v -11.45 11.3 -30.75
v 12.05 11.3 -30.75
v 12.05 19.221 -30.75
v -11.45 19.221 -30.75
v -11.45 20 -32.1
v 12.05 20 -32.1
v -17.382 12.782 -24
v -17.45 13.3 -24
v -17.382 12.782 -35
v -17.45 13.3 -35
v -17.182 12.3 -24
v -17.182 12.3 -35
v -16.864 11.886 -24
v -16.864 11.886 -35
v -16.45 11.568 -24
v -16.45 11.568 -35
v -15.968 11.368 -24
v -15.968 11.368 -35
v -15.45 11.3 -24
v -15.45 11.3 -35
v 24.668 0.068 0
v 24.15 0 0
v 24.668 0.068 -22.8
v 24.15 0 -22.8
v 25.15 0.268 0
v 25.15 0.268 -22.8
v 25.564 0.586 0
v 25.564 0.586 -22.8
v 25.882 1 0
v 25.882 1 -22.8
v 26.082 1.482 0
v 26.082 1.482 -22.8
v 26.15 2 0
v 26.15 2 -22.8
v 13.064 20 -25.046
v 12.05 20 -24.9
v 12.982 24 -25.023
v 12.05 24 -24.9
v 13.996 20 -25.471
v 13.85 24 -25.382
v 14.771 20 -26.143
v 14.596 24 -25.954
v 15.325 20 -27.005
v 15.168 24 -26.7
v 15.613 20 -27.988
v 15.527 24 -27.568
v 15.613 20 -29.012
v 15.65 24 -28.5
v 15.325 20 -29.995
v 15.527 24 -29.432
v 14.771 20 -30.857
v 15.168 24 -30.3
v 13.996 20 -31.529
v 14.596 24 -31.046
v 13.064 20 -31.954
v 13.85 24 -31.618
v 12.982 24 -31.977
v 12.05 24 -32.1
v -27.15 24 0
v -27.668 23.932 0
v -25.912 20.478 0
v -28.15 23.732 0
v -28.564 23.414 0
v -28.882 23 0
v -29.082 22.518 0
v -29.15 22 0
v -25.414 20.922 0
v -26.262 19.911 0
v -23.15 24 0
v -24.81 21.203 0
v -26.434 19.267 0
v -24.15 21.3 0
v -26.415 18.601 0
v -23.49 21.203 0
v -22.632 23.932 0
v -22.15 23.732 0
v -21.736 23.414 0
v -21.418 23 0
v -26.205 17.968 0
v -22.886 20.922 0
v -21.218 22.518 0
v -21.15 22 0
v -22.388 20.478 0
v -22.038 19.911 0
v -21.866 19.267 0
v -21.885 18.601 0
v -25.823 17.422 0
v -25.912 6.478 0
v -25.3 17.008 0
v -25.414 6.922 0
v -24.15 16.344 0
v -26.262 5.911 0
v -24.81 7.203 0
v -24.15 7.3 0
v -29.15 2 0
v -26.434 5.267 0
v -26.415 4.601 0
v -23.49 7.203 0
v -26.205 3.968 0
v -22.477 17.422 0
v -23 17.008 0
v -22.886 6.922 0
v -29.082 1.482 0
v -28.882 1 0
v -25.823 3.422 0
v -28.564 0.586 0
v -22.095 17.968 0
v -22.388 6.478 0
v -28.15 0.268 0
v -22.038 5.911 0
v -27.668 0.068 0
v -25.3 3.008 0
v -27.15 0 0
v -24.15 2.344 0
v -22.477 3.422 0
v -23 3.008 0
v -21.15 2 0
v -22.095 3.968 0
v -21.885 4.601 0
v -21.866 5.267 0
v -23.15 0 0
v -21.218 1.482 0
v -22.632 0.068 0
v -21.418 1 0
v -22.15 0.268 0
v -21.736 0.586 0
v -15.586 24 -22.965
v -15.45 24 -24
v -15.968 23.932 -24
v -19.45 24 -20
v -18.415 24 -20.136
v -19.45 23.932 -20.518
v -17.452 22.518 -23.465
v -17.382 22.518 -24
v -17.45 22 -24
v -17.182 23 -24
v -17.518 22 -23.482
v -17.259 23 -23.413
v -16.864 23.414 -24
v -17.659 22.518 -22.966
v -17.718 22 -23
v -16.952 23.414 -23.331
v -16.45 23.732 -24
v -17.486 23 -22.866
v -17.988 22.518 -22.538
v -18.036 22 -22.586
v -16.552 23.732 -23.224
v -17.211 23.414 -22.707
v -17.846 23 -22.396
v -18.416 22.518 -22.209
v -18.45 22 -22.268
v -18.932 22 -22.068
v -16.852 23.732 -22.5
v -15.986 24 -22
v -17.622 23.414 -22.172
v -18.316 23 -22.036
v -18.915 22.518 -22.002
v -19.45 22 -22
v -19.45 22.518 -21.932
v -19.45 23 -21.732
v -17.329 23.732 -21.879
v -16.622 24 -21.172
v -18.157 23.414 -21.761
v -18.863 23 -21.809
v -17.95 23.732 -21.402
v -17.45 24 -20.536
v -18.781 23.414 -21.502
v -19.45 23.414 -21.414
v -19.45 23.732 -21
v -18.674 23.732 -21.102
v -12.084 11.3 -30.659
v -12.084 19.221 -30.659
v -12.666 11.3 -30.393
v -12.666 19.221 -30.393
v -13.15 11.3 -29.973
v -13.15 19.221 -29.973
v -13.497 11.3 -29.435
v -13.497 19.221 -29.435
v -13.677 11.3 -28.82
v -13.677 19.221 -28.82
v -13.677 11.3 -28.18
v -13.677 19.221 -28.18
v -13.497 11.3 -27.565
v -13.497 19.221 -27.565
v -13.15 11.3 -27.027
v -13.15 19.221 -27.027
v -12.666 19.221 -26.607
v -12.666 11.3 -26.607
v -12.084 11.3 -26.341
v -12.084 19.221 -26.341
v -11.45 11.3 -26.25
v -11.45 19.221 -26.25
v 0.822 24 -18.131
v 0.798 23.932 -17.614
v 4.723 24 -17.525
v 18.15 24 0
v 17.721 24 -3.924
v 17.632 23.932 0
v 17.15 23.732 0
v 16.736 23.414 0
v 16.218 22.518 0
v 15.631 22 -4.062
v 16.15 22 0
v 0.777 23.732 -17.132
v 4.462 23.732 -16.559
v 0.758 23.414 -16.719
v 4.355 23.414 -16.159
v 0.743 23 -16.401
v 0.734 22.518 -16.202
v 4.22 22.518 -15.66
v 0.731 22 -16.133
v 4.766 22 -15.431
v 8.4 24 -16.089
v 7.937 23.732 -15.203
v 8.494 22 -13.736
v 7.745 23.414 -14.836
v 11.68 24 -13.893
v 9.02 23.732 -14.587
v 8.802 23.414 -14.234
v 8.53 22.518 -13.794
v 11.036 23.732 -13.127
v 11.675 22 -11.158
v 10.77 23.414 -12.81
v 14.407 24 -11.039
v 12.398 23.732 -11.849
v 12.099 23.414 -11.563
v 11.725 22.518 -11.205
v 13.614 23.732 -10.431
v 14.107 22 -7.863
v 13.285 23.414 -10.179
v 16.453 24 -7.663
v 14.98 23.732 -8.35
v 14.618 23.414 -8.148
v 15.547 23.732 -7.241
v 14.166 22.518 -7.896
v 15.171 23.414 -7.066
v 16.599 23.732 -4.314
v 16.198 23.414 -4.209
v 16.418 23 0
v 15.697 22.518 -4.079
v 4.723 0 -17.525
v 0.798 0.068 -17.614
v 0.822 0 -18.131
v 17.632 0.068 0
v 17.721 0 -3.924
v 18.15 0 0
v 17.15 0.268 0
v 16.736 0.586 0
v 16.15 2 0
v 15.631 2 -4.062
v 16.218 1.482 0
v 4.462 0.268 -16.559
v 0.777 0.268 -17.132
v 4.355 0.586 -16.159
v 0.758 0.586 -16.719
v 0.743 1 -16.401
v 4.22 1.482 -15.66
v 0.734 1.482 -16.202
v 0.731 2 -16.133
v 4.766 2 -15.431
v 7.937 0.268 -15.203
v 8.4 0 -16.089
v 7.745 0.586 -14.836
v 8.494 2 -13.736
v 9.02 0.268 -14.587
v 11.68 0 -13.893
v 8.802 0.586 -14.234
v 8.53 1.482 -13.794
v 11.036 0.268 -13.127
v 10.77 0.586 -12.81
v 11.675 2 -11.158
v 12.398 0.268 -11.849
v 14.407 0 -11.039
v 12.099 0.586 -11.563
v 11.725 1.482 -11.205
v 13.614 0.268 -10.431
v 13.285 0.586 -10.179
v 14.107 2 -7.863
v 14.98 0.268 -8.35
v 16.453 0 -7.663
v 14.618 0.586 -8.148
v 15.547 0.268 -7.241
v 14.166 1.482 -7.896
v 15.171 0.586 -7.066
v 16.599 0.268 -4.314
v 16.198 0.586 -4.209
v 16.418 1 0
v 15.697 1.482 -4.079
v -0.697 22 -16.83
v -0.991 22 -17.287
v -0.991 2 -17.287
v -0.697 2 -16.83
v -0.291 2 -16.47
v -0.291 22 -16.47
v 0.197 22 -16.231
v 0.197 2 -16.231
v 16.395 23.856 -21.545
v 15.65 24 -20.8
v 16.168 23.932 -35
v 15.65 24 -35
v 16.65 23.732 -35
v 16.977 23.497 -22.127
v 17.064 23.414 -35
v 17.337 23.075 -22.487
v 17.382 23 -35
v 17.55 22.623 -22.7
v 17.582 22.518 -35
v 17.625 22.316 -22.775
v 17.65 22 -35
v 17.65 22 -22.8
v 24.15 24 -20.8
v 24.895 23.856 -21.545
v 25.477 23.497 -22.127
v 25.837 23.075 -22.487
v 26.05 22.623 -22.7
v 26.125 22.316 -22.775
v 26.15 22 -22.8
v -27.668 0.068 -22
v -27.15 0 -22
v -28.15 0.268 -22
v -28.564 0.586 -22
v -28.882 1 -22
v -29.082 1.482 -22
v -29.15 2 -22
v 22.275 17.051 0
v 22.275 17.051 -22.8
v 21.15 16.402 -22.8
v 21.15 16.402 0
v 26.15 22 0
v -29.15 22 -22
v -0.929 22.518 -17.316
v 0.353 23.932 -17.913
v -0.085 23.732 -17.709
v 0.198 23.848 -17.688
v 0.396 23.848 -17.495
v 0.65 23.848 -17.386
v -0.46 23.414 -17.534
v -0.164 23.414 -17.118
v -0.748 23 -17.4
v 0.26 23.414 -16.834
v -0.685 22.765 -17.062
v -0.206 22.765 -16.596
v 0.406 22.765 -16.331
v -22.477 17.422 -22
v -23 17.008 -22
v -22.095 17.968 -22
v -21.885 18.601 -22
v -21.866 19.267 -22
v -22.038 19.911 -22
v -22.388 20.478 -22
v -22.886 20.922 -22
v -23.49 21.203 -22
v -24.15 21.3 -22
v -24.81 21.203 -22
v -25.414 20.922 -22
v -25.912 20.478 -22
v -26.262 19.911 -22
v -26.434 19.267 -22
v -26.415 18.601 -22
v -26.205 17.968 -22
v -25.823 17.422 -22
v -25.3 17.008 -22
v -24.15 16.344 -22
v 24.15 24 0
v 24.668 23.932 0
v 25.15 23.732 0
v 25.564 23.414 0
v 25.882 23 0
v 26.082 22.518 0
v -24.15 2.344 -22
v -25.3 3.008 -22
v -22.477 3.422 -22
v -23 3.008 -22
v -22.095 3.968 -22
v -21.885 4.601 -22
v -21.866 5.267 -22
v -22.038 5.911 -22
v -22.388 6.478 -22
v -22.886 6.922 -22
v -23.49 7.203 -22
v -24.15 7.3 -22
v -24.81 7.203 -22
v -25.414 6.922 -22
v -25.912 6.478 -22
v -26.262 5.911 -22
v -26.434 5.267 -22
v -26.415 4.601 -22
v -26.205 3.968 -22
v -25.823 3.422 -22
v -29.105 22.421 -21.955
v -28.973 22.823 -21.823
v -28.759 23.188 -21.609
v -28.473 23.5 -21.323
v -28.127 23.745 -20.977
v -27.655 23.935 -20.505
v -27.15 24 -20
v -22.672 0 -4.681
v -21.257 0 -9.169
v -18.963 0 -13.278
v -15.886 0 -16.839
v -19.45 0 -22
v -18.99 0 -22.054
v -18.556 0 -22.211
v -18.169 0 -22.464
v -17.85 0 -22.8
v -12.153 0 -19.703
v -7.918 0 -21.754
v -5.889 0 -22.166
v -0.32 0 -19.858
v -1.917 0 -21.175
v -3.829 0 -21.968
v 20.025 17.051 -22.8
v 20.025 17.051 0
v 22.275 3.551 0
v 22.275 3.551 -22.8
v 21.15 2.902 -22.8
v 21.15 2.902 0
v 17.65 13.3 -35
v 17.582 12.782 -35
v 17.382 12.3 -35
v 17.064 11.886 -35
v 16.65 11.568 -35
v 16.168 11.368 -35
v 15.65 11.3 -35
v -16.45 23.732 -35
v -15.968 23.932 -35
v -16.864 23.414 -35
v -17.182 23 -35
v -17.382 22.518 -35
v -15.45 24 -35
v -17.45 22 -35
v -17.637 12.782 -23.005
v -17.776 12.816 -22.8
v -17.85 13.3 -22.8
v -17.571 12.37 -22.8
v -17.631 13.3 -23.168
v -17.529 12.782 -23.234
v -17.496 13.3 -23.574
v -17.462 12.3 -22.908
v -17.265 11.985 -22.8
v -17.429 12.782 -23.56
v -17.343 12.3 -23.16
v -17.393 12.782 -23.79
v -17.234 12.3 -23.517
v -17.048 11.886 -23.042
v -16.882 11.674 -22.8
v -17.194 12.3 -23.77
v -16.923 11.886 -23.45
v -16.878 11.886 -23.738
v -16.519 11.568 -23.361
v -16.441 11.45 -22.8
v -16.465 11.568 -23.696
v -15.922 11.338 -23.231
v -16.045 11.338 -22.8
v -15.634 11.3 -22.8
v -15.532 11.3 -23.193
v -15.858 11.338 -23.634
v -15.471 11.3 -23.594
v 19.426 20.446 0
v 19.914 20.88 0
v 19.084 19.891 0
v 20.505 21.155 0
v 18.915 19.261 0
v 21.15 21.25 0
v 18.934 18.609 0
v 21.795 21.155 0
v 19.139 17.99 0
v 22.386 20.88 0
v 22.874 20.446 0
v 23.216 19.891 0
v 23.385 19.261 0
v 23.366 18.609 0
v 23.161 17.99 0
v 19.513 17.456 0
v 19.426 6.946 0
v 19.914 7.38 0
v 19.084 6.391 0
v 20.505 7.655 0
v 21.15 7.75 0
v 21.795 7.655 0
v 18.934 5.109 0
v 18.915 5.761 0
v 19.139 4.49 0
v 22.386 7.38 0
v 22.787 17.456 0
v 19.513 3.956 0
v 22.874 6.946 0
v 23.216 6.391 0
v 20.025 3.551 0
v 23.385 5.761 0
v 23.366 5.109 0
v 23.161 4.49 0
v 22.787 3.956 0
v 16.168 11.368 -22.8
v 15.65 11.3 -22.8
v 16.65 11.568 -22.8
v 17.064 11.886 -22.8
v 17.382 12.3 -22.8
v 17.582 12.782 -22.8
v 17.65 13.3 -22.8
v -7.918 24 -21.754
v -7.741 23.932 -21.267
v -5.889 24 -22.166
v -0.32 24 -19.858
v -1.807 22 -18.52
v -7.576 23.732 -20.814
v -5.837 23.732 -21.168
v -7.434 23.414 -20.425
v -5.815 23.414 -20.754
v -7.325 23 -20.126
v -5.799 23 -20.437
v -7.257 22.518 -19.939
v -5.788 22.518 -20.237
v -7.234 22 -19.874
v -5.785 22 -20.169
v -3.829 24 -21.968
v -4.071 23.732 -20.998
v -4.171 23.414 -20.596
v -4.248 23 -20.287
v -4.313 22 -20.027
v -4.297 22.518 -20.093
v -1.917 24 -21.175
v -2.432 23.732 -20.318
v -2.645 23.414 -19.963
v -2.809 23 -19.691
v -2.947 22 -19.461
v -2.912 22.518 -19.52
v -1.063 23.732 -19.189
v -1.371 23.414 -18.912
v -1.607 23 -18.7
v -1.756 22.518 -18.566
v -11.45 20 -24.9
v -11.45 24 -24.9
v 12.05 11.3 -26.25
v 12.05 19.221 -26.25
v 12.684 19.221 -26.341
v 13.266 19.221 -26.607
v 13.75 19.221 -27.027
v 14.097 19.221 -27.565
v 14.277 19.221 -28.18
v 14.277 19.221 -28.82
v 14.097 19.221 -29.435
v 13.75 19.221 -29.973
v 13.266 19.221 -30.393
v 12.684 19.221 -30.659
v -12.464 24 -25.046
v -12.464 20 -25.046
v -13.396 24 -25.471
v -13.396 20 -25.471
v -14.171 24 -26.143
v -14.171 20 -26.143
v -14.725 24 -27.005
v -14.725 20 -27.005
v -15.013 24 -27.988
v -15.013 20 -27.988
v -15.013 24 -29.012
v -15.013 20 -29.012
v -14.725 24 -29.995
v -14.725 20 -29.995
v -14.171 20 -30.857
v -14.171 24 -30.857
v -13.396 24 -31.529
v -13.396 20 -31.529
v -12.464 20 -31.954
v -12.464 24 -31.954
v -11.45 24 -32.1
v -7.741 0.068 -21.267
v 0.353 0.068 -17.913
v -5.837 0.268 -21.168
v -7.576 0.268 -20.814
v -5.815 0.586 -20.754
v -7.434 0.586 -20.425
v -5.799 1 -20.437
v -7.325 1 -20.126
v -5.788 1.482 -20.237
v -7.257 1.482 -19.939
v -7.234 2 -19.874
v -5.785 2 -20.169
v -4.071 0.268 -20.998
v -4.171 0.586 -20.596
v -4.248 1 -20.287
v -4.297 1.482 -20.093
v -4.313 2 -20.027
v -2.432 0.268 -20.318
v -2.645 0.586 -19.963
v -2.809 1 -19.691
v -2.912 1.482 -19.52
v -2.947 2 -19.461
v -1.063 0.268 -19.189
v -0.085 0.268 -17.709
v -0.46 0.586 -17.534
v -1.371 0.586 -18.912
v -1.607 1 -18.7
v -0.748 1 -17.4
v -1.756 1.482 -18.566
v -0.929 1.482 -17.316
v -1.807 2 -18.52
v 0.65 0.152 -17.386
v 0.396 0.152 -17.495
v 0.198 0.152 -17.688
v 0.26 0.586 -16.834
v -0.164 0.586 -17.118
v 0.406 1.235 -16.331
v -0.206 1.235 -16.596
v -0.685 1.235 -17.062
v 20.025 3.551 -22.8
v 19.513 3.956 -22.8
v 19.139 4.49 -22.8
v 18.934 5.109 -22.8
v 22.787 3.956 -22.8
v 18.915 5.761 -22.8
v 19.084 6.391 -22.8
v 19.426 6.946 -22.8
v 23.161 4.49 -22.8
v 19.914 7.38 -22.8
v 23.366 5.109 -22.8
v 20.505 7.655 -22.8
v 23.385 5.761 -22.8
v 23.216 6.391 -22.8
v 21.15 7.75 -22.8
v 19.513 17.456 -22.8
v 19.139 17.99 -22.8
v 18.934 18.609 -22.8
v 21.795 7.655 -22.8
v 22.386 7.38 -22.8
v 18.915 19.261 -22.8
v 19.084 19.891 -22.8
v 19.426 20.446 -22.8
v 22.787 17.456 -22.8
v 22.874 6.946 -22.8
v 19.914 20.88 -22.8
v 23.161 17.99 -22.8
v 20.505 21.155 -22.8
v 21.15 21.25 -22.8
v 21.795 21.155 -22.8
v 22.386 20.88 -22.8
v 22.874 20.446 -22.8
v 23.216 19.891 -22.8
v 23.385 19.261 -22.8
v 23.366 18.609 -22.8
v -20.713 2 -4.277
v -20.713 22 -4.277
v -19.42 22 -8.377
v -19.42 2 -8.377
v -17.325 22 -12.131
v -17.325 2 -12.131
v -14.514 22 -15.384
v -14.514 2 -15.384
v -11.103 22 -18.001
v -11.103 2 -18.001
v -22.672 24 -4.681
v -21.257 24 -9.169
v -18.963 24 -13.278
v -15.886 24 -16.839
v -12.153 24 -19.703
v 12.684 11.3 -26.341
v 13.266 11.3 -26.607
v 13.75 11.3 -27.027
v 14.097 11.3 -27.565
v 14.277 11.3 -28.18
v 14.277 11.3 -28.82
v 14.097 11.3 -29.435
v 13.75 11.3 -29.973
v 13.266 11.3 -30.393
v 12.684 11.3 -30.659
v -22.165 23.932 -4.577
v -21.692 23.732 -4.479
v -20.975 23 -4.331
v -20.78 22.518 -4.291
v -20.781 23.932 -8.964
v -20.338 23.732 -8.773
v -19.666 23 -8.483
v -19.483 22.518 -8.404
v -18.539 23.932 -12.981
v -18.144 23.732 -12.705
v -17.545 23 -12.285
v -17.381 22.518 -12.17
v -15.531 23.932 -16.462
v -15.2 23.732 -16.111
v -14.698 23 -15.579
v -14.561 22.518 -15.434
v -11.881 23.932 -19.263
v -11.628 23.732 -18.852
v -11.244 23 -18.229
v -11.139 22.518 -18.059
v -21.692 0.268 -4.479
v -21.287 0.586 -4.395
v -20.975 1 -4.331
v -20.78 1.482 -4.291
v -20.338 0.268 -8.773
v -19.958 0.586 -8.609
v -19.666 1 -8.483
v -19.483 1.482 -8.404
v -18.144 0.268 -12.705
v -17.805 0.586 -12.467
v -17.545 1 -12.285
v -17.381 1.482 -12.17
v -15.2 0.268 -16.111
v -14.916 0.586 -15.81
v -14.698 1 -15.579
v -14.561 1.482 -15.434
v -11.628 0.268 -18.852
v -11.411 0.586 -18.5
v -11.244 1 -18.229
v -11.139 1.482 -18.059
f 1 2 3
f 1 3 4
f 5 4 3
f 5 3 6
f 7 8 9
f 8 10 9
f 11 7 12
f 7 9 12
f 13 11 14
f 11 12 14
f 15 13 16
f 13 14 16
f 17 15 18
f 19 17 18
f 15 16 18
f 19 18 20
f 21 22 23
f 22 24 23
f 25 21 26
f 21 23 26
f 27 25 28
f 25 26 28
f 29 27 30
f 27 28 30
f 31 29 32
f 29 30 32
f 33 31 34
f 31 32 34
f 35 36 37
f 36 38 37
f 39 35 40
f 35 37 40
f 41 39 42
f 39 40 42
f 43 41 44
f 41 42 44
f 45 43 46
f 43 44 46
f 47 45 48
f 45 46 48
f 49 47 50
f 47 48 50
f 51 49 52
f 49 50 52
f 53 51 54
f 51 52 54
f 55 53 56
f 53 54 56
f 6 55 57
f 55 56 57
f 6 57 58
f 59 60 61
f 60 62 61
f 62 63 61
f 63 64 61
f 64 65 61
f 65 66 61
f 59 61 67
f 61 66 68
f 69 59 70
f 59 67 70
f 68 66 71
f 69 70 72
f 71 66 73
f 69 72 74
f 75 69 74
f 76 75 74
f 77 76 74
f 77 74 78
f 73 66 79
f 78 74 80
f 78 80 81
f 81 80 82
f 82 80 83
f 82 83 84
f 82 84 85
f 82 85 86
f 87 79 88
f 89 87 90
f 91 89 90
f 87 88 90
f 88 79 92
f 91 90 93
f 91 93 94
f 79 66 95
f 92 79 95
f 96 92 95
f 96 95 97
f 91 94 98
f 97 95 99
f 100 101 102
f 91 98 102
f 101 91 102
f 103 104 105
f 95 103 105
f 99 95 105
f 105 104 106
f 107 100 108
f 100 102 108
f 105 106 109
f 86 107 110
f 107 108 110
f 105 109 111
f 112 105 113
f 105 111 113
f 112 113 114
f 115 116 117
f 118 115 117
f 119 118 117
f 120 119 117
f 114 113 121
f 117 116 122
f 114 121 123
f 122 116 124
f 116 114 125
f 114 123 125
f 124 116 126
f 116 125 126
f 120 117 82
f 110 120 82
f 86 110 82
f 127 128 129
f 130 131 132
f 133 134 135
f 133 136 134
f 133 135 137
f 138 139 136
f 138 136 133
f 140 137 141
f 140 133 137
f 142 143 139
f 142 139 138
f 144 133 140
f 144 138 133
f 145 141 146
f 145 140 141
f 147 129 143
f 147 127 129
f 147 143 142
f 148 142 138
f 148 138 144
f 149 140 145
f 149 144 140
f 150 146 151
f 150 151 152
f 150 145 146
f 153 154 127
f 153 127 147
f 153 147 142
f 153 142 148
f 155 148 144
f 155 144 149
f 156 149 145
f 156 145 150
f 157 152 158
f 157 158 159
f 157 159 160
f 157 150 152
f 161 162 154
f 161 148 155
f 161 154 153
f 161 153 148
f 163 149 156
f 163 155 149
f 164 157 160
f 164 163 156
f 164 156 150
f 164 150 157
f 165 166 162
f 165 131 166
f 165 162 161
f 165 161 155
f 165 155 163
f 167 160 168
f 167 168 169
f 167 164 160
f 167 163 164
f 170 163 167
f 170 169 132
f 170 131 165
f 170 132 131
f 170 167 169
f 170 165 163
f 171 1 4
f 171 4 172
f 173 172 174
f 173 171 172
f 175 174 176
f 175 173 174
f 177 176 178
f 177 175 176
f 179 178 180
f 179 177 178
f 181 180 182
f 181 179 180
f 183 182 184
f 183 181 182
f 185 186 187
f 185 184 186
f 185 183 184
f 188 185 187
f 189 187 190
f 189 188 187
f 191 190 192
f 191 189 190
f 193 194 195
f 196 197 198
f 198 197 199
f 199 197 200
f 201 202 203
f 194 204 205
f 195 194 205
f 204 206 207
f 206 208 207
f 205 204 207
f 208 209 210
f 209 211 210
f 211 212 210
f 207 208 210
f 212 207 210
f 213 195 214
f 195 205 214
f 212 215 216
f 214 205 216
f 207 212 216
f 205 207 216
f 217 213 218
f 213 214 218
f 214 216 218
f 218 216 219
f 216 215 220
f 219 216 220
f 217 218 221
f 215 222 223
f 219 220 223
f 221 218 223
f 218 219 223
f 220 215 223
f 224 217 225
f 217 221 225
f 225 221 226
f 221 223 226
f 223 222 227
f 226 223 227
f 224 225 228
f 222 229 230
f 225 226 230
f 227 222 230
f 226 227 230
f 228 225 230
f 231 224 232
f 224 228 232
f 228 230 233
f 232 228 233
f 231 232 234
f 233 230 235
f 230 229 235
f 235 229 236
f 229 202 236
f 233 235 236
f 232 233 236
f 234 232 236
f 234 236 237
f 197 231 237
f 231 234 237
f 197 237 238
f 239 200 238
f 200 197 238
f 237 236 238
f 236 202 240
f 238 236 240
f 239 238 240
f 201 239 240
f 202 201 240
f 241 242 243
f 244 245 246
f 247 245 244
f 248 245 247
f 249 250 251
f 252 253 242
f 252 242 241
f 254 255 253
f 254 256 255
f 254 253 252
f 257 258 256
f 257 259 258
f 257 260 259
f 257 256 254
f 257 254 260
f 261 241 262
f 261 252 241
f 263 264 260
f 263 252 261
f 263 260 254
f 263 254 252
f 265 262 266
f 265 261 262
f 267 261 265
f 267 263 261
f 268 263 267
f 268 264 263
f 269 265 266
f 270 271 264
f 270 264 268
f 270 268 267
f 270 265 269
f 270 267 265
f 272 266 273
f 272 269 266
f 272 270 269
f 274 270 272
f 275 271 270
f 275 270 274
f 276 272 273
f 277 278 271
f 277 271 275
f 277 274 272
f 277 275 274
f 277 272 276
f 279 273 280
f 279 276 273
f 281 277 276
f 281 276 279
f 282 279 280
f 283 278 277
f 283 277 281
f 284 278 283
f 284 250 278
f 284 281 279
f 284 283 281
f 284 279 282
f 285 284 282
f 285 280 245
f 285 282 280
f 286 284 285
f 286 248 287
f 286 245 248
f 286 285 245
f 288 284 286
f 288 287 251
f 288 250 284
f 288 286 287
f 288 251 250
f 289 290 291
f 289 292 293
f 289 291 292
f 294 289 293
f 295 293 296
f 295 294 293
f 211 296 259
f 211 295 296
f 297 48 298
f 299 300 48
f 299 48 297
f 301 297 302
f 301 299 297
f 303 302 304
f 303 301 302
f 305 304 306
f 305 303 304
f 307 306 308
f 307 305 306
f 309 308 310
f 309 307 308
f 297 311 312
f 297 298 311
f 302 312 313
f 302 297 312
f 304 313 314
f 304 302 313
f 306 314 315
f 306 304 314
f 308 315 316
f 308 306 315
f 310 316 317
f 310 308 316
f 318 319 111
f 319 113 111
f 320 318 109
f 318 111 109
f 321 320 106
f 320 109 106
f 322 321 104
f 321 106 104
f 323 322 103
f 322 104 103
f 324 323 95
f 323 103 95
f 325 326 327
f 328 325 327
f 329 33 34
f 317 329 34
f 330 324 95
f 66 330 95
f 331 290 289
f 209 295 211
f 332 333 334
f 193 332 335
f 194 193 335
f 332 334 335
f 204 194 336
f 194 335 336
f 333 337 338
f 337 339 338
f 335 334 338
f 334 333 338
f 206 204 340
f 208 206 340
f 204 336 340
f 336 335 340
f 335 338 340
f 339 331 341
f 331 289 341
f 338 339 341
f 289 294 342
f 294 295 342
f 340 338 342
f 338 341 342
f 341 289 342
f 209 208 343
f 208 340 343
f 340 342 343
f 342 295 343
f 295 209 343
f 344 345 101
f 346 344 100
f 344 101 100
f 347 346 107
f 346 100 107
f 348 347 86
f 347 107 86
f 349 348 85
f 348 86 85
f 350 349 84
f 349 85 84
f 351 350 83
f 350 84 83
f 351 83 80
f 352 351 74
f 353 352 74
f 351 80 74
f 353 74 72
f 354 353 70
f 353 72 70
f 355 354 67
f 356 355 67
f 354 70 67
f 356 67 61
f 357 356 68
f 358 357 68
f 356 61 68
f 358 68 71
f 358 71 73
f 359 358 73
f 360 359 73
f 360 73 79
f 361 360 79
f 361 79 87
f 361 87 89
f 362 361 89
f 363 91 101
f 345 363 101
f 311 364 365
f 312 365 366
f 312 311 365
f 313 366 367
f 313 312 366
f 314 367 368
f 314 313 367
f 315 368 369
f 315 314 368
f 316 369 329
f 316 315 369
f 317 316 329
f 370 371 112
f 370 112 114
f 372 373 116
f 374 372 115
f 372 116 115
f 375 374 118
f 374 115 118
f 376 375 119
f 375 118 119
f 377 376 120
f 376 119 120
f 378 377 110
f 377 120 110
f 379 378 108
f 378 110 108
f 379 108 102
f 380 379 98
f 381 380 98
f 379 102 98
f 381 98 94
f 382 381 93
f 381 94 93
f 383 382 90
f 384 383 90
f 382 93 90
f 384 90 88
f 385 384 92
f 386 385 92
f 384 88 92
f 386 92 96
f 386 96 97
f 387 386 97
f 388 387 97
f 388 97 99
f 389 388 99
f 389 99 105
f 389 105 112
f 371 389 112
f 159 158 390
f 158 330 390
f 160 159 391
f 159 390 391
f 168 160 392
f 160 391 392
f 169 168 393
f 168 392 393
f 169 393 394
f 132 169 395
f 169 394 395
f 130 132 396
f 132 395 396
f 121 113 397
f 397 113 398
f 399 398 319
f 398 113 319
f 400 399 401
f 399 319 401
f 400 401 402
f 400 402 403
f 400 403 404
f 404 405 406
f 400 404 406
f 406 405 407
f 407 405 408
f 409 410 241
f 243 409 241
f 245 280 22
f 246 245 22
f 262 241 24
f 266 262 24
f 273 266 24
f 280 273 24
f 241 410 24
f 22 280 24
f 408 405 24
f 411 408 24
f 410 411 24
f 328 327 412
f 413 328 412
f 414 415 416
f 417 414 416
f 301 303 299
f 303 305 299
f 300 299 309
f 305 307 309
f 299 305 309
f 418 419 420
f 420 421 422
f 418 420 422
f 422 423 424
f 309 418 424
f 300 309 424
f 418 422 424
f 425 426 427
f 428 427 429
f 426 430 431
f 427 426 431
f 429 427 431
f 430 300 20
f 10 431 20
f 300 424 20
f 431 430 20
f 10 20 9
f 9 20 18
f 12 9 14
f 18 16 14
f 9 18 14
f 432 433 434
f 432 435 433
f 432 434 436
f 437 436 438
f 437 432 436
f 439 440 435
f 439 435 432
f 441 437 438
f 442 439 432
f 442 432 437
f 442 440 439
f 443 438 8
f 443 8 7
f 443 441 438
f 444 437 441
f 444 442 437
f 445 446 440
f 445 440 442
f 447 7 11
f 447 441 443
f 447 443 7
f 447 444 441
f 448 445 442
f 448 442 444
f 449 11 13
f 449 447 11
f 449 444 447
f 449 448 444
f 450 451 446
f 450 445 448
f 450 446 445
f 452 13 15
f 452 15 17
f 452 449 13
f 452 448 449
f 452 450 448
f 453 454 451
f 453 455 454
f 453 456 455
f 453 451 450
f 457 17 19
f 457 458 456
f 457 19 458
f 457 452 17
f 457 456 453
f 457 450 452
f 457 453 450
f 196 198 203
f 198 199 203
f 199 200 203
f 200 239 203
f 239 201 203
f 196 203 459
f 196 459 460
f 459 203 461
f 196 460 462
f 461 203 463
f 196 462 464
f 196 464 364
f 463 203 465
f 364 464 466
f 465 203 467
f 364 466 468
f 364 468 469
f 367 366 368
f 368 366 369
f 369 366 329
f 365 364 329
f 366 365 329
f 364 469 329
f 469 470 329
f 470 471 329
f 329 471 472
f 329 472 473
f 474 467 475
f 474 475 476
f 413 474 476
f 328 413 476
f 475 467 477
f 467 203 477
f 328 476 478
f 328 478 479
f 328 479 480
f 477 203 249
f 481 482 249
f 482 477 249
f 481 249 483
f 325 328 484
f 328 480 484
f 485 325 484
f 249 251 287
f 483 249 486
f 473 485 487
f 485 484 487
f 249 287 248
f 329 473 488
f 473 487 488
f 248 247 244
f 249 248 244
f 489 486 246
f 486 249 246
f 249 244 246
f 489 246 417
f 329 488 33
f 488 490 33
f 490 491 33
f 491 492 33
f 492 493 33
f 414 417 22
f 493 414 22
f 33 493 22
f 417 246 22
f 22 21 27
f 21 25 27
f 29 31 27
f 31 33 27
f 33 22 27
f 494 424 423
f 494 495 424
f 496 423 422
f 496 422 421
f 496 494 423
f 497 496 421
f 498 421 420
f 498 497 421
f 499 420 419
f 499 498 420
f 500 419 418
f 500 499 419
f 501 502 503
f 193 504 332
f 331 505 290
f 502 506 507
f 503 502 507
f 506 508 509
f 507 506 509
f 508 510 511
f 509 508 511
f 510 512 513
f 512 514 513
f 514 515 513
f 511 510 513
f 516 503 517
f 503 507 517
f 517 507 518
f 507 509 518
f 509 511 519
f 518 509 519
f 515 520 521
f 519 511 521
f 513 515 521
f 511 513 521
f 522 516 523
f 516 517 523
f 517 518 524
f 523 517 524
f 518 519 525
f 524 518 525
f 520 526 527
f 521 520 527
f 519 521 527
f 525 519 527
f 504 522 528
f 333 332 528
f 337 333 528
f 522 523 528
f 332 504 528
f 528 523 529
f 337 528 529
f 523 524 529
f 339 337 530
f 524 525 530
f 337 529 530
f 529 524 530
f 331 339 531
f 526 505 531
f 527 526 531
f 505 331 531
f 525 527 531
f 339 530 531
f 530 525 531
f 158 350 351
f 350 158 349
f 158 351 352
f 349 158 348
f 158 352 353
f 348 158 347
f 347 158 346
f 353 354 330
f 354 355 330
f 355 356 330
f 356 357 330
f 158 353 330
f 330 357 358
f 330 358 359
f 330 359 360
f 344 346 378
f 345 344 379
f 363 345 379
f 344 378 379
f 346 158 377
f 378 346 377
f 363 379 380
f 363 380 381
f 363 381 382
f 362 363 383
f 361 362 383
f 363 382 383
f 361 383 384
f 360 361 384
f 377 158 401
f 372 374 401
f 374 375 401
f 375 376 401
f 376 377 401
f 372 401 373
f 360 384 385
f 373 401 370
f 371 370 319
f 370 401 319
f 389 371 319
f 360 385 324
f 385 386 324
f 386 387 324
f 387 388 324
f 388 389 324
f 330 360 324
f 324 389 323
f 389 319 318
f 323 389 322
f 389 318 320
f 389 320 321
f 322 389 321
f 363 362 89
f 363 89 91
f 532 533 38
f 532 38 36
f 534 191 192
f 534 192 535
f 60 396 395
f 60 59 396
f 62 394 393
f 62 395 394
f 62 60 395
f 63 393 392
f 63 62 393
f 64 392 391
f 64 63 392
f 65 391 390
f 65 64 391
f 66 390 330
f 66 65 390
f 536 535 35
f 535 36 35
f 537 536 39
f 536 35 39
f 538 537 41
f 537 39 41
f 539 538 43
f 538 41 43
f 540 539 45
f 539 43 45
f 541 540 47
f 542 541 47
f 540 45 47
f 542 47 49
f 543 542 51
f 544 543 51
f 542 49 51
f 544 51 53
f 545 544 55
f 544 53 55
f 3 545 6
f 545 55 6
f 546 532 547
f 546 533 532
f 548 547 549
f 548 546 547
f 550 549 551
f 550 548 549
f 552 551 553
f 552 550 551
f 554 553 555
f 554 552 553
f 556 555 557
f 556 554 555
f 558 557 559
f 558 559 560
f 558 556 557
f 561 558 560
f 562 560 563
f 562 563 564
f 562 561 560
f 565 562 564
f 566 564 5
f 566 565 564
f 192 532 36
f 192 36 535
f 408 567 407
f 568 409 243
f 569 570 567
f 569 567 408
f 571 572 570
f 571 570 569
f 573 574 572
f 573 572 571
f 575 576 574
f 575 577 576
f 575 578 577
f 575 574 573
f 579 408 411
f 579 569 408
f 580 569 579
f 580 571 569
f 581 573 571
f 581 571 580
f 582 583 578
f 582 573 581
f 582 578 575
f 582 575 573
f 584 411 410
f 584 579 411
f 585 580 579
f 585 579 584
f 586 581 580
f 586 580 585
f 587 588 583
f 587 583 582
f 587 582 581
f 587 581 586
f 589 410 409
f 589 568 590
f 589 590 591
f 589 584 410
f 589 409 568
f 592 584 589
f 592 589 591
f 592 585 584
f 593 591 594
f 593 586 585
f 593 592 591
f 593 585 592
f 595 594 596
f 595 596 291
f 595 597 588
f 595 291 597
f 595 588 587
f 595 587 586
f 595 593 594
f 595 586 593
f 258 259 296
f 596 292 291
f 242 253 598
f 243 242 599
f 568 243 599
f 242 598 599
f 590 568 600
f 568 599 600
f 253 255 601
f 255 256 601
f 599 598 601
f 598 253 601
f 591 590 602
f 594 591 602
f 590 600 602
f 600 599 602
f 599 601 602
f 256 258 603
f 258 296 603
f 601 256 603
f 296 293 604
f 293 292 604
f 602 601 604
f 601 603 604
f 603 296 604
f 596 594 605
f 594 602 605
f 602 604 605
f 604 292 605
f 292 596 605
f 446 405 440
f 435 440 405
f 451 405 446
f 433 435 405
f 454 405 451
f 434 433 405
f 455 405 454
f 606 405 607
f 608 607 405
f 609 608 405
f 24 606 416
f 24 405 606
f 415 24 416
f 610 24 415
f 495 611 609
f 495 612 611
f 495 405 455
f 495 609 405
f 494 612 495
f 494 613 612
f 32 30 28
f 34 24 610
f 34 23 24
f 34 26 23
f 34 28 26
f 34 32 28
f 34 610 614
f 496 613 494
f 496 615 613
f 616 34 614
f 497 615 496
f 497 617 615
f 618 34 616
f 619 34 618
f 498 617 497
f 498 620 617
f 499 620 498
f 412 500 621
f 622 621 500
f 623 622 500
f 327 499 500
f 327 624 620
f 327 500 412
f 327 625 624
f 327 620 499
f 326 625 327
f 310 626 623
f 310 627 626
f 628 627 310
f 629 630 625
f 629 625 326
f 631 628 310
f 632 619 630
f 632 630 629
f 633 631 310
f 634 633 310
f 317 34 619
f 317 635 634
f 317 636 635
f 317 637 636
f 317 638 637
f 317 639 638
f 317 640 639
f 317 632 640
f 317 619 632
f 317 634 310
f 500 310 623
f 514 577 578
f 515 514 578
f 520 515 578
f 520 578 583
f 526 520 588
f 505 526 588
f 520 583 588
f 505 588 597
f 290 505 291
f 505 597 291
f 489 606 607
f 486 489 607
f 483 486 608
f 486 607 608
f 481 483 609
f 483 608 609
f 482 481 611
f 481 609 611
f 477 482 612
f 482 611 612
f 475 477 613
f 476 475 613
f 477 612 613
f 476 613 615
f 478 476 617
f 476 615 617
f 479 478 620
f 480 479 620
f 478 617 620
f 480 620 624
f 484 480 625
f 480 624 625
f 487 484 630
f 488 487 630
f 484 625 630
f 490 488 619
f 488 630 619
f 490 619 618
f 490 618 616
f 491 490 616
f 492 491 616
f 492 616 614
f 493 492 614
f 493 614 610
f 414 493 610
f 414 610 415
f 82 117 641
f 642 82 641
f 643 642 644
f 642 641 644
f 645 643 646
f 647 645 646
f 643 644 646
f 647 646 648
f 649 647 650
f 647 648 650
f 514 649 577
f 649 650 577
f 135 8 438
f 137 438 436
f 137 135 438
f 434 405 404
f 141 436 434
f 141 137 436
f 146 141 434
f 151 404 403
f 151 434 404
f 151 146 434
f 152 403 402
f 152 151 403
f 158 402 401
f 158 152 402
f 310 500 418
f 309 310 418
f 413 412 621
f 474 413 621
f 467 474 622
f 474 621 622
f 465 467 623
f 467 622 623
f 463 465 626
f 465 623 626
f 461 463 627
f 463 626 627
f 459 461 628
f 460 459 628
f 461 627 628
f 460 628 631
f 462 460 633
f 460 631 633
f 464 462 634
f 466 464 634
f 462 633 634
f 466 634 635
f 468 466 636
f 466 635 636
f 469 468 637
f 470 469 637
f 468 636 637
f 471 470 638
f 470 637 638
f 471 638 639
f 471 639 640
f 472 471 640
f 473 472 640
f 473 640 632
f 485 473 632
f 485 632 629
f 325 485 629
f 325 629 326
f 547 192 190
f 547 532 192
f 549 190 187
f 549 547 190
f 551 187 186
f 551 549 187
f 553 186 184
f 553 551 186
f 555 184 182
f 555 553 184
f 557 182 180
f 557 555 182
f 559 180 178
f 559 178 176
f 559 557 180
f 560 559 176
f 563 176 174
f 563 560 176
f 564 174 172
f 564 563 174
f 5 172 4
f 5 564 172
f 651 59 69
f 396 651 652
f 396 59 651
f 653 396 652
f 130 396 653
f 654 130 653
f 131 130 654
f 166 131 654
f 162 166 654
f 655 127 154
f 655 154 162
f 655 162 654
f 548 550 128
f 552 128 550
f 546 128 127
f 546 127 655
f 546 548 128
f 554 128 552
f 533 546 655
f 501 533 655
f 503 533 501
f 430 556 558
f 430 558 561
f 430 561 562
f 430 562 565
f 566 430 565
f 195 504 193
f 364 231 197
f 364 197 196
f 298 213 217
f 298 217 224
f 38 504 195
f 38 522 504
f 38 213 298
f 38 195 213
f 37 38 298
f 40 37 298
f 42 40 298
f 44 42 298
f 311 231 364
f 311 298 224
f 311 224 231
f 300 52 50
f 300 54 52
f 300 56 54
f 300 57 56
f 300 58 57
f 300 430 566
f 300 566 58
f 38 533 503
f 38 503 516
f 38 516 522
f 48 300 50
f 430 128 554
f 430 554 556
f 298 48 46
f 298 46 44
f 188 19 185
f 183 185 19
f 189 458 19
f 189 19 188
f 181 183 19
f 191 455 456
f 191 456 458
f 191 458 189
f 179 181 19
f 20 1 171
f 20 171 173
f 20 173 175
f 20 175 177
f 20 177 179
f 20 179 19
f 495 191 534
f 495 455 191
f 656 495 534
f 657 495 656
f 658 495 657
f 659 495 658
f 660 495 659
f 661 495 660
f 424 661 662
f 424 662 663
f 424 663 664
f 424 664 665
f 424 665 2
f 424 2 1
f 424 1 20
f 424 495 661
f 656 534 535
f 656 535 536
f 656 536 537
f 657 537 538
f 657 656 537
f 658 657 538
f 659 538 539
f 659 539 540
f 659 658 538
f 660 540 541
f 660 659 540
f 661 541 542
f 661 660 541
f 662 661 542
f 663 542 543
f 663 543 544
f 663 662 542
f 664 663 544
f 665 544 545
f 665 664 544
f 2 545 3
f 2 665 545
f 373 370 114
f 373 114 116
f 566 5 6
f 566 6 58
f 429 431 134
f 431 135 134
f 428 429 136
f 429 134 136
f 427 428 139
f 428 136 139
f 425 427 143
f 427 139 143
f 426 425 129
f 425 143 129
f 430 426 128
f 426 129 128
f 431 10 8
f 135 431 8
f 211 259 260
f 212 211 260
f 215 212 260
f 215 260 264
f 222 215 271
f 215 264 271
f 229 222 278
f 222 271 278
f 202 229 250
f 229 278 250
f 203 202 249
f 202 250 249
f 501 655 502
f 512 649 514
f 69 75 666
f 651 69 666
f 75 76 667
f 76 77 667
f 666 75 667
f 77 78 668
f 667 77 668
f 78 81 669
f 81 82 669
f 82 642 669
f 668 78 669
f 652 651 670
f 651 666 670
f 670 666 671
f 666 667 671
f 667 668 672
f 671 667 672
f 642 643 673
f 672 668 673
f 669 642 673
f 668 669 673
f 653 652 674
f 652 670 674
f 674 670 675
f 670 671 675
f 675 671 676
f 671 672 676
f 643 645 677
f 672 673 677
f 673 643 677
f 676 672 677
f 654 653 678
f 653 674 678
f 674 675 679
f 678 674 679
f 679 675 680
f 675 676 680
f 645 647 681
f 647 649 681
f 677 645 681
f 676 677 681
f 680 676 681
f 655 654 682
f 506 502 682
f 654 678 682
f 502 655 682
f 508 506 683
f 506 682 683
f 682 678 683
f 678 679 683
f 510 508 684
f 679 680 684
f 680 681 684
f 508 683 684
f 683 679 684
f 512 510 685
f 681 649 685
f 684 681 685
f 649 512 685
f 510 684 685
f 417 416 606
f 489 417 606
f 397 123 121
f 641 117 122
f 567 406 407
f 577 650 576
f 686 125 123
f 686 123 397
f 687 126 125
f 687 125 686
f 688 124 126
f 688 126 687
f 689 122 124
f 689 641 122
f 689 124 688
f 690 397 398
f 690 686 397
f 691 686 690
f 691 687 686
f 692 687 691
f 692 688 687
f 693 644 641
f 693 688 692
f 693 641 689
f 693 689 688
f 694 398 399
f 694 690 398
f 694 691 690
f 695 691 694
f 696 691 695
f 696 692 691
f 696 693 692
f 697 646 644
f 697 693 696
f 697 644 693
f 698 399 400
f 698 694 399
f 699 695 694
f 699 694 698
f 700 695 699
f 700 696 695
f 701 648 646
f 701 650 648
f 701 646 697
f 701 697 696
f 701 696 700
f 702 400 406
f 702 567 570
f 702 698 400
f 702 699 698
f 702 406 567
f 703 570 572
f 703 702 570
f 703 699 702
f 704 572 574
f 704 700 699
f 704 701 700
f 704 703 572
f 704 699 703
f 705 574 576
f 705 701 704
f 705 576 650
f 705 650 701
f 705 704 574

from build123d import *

# Parameters (mm, degrees)
AUFSATZ_LINEAR_AUSTRAGEN1_DEPTH = 24
VERRUNDUNG1_R                   = 2
SKIZZE6_R                       = 2.3
SCHNITT_LINEAR_AUSTRAGEN2_DEPTH = 100
SKIZZE7_W                       = 12.2
SKIZZE7_H                       = 11.3
SCHNITT_LINEAR_AUSTRAGEN3_DEPTH = 56.3
SCHNITT_LINEAR_AUSTRAGEN4_DEPTH = 25
SCHNITT_LINEAR_AUSTRAGEN5_DEPTH = 13.7
VERRUNDUNG2_R                   = 2
SCHNITT_LINEAR_AUSTRAGEN6_DEPTH = 23.5


with BuildPart() as part:
    # Skizze1 → Aufsatz-Linear austragen1 (new body)
    with BuildSketch(Plane(origin=(0, 0, 0), x_dir=(1, 0, 0), z_dir=(0, 1, 0))):
        with BuildLine():
            Line((-29.15, 22), (-29.15, 0))
            Line((-29.15, 0), (-21.15, 0))
            ThreePointArc((-21.15, 0), (-17.325065737, 12.131141629), (-7.233726031, 19.87449893))
            ThreePointArc((-7.233726031, 19.87449893), (-3.065111361, 19.529851295), (-0.617075906, 16.138206757))
            ThreePointArc((-0.617075906, 16.138206757), (11.199480437, 11.635898674), (16.15, 0))
            Line((16.15, 0), (26.15, 0))
            Line((26.15, 0), (26.15, 22.8))
            Line((26.15, 22.8), (17.65, 22.8))
            Line((17.65, 22.8), (17.65, 35))
            Line((17.65, 35), (-17.45, 35))
            Line((-17.45, 35), (-17.45, 22))
            Line((-17.45, 22), (-29.15, 22))
        make_face()
    extrude(amount=AUFSATZ_LINEAR_AUSTRAGEN1_DEPTH)

    # Verrundung1
    verrundung1_edges = [part.edges().sort_by_distance(p)[0] for p in [
        (-17.45, 12, -22),
    ]]
    fillet(verrundung1_edges, radius=VERRUNDUNG1_R)

    # Skizze6 → Schnitt-Linear austragen2 (cut)
    with BuildSketch(Plane.XY):
        with Locations((-24.15, 19)):
            Circle(SKIZZE6_R)
        with Locations((-24.15, 5)):
            Circle(SKIZZE6_R)
        with BuildLine():
            Line((-25.3, 17.008141571), (-24.15, 16.344188762))
            Line((-24.15, 16.344188762), (-23, 17.008141571))
            ThreePointArc((-23, 17.008141571), (-24.15, 16.7), (-25.3, 17.008141571))
        make_face()
        with BuildLine():
            Line((-25.3, 3.008141571), (-24.15, 2.344188762))
            Line((-24.15, 2.344188762), (-23, 3.008141571))
            ThreePointArc((-23, 3.008141571), (-24.15, 2.7), (-25.3, 3.008141571))
        make_face()
    extrude(amount=-SCHNITT_LINEAR_AUSTRAGEN2_DEPTH, mode=Mode.SUBTRACT)

    # Skizze7 → Schnitt-Linear austragen3 (cut, through all)
    with BuildSketch(Plane(origin=(26.15, 0, 0), x_dir=(0, 0, -1), z_dir=(1, 0, 0))):
        with Locations((28.9, 5.65)):
            Rectangle(SKIZZE7_W, SKIZZE7_H)
    extrude(amount=-SCHNITT_LINEAR_AUSTRAGEN3_DEPTH, mode=Mode.SUBTRACT)

    # Skizze8 → Schnitt-Linear austragen4 (cut)
    with BuildSketch(Plane(origin=(0, 0, -22.8), x_dir=(-1, 0, 0), z_dir=(0, 0, -1))):
        with BuildLine():
            Line((-22.275, 3.551442841), (-21.15, 2.901923789))
            Line((-21.15, 2.901923789), (-20.025, 3.551442841))
            ThreePointArc((-20.025, 3.551442841), (-21.15, 7.75), (-22.275, 3.551442841))
        make_face()
        with BuildLine():
            Line((-22.275, 17.051442841), (-21.15, 16.401923789))
            Line((-21.15, 16.401923789), (-20.025, 17.051442841))
            ThreePointArc((-20.025, 17.051442841), (-21.15, 21.25), (-22.275, 17.051442841))
        make_face()
    extrude(amount=-SCHNITT_LINEAR_AUSTRAGEN4_DEPTH, mode=Mode.SUBTRACT)

    # Skizze10 → Schnitt-Linear austragen5 (cut, through all)
    with BuildSketch(Plane.XZ.offset(-11.3)):
        with BuildLine():
            Line((-11.45, -26.25), (12.05, -26.25))
            ThreePointArc((12.05, -26.25), (14.3, -28.5), (12.05, -30.75))
            Line((12.05, -30.75), (-11.45, -30.75))
            ThreePointArc((-11.45, -30.75), (-13.7, -28.5), (-11.45, -26.25))
        make_face()
    extrude(amount=-SCHNITT_LINEAR_AUSTRAGEN5_DEPTH, mode=Mode.SUBTRACT)

    # Verrundung2
    verrundung2_edges = [part.edges().sort_by_distance(p)[0] for p in [
        (-3.065111361, 24, -19.529851295),
        (-29.15, 0, -11),
        (11.199480437, 24, -11.635898674),
        (26.15, 0, -11.4),
        (11.199480437, 0, -11.635898674),
        (-3.065111361, 0, -19.529851295),
        (-17.325065737, 0, -12.131141629),
        (-0.617075906, 12, -16.138206757),
        (26.15, 24, -11.4),
        (21.9, 24, -22.8),
        (17.65, 24, -28.9),
        (-17.45, 24, -29.5),
        (-18.035786438, 24, -22.585786438),
        (-24.3, 24, -22),
        (-29.15, 24, -11),
        (-17.325065737, 24, -12.131141629),
        (-17.552633404, 11.3, -23.367544468),
        (17.65, 11.3, -28.9),
        (-17.45, 11.3, -29.5),
    ]]
    fillet(verrundung2_edges, radius=VERRUNDUNG2_R)

    # Skizze12 → Schnitt-Linear austragen6 (cut)
    with BuildSketch(Plane(origin=(-11.45, 0, 0), x_dir=(0, 0, -1), z_dir=(1, 0, 0))):
        Polygon((24.9, 24), (24.9, 20), (26.25, 19.220577137), (30.75, 19.220577137), (32.1, 20), (32.1, 24), align=None)
    extrude(amount=SCHNITT_LINEAR_AUSTRAGEN6_DEPTH, mode=Mode.SUBTRACT)

    # Skizze12<3> one side → Schnitt-Rotation1 (revolve, cut)
    with BuildSketch(Plane(origin=(-11.45, 0, 0), x_dir=(0, 0, -1), z_dir=(1, 0, 0))):
        Polygon((32.1, 24), (28.5, 24), (28.5, 19.220577137), (30.75, 19.220577137), (32.1, 20), align=None)
    schnitt_rotation1 = revolve(axis=Axis((-11.45, 24, -28.5), (0, -1, 0)), mode=Mode.SUBTRACT)

    # Spiegeln1: Schnitt-Rotation1 across plane
    add(schnitt_rotation1.mirror(Plane.ZY.offset(-0.3)), mode=Mode.SUBTRACT)


solid = part.part
